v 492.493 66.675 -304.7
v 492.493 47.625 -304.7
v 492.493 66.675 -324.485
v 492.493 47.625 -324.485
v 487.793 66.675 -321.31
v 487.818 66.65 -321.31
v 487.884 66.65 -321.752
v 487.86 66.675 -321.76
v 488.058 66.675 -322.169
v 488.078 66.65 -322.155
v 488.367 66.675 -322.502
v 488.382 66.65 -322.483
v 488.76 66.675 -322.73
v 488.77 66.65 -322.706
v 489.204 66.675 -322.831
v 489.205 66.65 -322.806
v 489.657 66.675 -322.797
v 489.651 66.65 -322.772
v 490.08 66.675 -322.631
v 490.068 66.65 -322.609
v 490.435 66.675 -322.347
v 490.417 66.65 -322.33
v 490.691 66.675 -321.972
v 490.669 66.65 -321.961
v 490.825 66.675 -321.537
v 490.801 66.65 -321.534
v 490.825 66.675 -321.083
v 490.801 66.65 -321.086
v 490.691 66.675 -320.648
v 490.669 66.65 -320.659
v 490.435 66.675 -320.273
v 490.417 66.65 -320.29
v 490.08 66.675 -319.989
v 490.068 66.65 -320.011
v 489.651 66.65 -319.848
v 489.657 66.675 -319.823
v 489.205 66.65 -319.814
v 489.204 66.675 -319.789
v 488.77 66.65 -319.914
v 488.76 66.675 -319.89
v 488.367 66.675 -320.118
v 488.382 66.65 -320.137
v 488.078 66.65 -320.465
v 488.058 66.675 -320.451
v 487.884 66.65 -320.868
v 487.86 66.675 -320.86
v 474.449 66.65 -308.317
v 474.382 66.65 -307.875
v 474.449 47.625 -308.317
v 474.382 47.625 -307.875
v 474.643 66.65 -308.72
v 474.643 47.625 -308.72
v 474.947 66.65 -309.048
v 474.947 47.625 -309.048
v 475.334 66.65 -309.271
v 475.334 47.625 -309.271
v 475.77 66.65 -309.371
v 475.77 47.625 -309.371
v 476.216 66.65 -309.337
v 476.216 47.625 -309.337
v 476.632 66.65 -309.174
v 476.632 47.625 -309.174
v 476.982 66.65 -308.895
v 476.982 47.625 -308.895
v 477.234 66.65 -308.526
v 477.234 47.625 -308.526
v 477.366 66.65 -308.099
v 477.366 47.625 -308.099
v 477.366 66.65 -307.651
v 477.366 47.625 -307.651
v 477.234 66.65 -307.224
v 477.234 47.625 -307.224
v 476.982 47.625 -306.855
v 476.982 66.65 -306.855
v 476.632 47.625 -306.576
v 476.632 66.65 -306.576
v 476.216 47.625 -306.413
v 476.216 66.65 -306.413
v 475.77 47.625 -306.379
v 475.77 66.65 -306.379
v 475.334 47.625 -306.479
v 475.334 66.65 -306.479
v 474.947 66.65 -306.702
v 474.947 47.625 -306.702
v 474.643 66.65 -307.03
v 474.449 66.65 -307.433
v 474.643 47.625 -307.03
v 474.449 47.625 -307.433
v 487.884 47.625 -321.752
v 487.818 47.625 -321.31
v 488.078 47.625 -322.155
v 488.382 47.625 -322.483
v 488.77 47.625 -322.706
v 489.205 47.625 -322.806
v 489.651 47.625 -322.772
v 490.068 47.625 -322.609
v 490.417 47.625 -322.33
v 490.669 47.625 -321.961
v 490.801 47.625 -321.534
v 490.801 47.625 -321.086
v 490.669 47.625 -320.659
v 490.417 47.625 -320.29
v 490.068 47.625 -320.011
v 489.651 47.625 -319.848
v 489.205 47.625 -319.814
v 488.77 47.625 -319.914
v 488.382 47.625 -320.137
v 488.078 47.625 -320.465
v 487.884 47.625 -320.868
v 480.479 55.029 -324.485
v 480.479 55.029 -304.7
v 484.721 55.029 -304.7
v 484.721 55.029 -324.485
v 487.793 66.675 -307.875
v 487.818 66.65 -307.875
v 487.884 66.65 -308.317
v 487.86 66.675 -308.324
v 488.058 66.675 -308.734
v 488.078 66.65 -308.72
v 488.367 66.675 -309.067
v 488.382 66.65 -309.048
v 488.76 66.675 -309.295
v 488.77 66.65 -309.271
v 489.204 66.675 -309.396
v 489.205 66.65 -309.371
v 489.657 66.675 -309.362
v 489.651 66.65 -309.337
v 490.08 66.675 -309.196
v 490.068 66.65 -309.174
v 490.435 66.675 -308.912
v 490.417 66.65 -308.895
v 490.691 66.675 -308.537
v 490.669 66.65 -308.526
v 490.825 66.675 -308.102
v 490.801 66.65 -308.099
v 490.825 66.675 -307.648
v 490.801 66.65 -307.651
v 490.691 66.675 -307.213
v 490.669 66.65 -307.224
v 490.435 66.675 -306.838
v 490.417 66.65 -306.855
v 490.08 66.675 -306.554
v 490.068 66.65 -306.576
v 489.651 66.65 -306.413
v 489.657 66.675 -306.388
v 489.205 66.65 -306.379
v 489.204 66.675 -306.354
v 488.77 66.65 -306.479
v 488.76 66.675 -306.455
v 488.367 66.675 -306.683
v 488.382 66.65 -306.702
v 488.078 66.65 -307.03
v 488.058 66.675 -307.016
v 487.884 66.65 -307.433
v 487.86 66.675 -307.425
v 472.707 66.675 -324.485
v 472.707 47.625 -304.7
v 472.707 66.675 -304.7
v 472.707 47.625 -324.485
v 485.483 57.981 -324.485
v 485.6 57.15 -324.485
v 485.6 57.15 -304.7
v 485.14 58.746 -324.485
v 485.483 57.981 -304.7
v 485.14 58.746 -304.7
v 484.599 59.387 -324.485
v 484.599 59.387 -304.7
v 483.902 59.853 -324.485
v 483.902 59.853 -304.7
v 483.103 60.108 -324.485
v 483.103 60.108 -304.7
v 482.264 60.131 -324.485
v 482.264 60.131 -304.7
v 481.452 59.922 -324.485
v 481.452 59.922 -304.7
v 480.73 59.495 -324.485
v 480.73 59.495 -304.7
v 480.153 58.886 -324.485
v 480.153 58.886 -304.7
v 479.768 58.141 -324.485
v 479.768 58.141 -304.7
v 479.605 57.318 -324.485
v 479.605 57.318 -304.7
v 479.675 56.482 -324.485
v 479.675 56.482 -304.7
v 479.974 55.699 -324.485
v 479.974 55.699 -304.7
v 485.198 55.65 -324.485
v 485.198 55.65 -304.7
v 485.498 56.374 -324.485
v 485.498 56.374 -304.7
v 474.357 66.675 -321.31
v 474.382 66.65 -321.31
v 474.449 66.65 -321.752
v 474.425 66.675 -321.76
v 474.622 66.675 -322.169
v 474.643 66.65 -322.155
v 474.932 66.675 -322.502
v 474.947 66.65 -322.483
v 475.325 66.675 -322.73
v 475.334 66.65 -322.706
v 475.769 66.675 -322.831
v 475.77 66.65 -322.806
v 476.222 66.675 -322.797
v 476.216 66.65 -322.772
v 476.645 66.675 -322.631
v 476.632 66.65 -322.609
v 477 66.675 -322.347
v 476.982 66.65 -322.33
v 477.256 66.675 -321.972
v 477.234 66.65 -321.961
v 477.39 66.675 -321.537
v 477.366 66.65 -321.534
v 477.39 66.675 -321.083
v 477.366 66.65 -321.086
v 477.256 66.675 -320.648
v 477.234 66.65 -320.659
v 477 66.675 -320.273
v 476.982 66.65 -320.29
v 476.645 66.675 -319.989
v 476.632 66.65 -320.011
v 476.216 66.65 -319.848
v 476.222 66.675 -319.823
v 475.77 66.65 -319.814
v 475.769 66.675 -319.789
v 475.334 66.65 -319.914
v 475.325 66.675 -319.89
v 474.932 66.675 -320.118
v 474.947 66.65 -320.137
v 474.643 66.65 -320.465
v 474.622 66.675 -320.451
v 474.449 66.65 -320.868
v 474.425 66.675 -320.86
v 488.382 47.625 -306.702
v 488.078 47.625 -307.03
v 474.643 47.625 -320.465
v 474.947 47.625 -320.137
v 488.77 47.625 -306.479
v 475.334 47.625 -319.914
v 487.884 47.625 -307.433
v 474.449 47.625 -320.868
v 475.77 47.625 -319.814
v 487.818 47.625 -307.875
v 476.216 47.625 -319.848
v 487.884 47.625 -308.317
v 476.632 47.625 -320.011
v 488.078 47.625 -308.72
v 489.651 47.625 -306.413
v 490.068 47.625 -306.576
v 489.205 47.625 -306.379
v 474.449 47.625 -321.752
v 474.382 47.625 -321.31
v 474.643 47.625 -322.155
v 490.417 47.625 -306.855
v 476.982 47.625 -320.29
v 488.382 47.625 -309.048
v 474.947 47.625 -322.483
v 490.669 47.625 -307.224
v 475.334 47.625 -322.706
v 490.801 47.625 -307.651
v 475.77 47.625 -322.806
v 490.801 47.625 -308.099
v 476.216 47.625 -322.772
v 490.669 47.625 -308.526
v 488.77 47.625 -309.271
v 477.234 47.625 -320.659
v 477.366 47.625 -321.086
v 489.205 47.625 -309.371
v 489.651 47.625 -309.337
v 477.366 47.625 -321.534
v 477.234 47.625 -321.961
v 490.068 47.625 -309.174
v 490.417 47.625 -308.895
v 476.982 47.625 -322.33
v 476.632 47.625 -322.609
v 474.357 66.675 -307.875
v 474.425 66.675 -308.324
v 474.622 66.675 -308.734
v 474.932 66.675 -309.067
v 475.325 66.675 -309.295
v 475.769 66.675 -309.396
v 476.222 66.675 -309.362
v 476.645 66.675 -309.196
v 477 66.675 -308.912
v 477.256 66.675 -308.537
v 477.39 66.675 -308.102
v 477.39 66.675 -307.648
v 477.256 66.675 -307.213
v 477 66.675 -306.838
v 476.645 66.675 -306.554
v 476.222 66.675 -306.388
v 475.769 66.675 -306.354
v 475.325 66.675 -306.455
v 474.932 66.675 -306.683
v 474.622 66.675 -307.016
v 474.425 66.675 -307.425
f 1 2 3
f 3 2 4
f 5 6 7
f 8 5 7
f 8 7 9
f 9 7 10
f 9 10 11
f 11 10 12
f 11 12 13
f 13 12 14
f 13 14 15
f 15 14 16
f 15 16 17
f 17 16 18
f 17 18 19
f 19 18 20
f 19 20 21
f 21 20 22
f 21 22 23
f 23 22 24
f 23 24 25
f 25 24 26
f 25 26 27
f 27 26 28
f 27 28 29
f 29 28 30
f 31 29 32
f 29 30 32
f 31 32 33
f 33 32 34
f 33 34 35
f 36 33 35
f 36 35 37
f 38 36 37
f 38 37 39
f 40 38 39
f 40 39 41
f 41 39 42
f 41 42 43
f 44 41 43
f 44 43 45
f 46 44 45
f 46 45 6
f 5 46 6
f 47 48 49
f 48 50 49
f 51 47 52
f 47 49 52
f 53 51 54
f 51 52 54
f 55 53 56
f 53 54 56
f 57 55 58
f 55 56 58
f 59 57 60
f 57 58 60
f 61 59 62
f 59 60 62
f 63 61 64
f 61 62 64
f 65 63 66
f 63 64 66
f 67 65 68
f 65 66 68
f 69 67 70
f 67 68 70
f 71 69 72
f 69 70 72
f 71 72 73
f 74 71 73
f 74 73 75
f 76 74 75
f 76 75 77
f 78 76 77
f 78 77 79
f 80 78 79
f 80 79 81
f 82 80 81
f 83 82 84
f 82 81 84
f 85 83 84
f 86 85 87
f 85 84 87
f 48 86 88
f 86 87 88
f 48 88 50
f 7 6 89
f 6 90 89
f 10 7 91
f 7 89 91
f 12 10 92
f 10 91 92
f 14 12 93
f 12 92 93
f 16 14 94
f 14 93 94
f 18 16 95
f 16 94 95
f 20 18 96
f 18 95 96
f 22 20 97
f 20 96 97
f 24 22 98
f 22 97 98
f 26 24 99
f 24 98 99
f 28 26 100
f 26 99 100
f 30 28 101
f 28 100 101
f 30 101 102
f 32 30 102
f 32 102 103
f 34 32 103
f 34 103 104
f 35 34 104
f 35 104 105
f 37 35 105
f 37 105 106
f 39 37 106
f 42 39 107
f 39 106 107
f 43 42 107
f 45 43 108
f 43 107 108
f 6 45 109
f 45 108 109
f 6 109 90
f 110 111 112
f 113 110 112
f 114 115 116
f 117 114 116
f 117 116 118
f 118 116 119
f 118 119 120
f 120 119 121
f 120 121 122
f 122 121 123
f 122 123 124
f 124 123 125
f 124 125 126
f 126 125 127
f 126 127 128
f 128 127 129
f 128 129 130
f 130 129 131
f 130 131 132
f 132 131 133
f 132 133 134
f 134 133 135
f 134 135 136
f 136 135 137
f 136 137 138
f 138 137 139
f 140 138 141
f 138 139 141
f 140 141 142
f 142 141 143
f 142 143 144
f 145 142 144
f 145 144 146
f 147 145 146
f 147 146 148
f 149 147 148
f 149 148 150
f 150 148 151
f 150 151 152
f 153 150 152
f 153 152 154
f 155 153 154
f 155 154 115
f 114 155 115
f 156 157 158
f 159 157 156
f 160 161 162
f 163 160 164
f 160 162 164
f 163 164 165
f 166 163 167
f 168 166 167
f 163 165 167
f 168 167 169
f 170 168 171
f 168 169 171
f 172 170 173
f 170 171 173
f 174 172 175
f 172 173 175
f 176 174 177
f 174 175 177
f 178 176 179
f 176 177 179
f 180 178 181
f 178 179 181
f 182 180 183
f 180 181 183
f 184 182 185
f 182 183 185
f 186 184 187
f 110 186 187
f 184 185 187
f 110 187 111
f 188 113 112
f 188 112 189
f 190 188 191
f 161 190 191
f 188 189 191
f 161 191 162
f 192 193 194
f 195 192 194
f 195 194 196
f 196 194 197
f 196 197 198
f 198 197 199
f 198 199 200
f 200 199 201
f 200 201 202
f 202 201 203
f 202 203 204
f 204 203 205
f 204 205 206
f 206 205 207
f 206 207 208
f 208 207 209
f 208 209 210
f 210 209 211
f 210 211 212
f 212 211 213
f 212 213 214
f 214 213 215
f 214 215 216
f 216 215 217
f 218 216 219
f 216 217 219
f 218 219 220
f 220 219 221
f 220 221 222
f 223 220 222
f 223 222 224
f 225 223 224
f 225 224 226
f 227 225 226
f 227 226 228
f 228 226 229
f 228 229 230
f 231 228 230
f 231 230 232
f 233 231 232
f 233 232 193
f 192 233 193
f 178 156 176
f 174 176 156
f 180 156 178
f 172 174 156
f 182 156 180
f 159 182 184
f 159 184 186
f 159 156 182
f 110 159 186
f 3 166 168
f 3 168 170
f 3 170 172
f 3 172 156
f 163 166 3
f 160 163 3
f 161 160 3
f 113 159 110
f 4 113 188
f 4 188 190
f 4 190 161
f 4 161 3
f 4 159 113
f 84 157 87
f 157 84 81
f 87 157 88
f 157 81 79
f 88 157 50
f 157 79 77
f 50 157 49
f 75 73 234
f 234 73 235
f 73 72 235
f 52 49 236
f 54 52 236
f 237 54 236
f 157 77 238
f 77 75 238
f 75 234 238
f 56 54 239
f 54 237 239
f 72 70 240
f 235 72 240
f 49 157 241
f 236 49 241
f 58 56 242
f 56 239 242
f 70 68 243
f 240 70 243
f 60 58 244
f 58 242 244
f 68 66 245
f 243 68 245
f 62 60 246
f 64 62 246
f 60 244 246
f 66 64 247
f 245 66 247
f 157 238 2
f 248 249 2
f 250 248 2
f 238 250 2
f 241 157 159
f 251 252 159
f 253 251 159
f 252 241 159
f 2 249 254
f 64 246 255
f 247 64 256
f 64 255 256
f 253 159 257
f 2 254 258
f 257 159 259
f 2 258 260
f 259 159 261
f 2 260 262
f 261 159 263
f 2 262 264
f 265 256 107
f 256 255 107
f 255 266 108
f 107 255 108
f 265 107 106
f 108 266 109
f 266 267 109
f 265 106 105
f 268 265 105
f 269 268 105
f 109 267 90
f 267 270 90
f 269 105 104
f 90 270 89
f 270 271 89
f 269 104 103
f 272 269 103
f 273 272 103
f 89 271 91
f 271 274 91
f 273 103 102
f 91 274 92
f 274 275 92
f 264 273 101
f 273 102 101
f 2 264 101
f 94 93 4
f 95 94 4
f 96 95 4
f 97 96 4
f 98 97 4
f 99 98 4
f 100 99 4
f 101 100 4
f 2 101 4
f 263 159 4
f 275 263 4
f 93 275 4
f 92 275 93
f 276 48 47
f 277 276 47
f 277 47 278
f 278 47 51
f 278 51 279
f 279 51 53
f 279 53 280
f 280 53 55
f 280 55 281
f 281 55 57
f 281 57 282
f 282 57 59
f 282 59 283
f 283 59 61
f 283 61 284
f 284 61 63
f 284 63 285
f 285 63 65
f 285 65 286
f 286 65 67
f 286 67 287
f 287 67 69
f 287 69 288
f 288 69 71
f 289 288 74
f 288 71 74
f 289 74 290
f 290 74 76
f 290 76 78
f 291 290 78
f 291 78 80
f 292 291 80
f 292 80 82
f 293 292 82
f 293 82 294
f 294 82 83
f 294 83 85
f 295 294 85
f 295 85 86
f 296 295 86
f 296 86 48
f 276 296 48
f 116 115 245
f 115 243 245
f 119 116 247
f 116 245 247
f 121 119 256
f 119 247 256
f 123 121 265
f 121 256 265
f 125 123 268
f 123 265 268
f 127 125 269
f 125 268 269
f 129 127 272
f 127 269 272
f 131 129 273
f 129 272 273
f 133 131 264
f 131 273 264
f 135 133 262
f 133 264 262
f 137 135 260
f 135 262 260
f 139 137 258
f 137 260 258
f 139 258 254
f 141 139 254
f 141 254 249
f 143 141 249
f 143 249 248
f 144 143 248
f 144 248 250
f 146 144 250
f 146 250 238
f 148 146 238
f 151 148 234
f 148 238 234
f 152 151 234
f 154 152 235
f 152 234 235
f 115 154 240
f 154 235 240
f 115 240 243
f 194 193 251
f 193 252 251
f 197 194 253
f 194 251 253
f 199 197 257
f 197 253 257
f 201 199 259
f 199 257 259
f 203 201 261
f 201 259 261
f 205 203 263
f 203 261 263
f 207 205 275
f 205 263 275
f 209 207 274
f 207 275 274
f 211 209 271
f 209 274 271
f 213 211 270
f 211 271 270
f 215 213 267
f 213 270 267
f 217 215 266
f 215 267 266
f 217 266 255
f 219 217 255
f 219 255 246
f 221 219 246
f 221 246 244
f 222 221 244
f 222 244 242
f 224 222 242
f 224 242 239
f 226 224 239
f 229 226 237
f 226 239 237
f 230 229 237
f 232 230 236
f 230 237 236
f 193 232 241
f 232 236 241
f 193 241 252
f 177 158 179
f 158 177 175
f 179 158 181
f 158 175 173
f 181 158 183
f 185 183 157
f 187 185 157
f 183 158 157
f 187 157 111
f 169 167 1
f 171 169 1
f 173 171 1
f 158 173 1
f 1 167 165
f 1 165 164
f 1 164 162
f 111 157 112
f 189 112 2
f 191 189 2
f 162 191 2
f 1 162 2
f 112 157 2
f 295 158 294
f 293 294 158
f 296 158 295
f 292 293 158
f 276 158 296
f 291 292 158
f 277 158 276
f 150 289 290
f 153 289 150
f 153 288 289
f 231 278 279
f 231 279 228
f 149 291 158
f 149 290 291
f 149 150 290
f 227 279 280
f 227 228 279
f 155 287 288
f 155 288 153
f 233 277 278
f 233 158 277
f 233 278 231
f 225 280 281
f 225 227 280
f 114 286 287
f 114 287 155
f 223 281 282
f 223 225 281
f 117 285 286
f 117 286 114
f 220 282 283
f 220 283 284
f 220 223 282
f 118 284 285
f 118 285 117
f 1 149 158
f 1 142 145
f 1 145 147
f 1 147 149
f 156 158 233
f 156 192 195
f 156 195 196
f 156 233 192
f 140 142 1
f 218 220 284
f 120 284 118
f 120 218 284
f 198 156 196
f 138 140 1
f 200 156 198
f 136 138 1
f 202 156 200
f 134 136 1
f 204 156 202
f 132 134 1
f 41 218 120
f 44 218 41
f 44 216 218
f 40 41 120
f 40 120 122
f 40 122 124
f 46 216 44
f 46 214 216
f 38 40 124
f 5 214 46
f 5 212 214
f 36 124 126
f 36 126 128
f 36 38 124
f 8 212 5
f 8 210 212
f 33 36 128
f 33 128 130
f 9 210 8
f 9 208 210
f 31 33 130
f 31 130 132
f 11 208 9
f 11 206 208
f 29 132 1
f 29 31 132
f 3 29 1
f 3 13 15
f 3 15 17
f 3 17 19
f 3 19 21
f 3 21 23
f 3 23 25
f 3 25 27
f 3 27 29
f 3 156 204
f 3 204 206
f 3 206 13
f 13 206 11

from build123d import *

# Parameters (mm, degrees)
BOSS_EXTRUDE1_START             = 47.625
SKETCH5_W                       = 19.785028842
SKETCH5_H                       = 19.785028843
BOSS_EXTRUDE1_DEPTH             = 19.05
F_3_0MM_DOWEL_HOLE1_D           = 3
F_3_0MM_DOWEL_HOLE1_DEPTH       = 25.4
F_3_0MM_DOWEL_HOLE1_CSINK_D     = 3.05
F_3_0MM_DOWEL_HOLE1_CSINK_ANGLE = 90
F_3_0MM_DOWEL_HOLE1_TIP         = 0.901290929
CUT_EXTRUDE1_DEPTH              = 594.535969939


with BuildPart() as part:
    # Sketch5 → Boss-Extrude1 (new body)
    with BuildSketch(Plane(origin=(0, 0, 0), x_dir=(1, 0, 0), z_dir=(0, 1, 0)).offset(BOSS_EXTRUDE1_START)):
        with Locations((482.6, 314.592485579)):
            Rectangle(SKETCH5_W, SKETCH5_H)
    extrude(amount=BOSS_EXTRUDE1_DEPTH)

    # Ø3.0mm Dowel Hole1
    with Locations(Plane(origin=(0, 66.675, 0), x_dir=(1, 0, 0), z_dir=(0, 1, 0))):
        with Locations((475.882485579, 321.31), (489.317514421, 321.31), (489.317514421, 307.874971157), (475.882485579, 307.874971157)):
            CounterSinkHole(F_3_0MM_DOWEL_HOLE1_D / 2, F_3_0MM_DOWEL_HOLE1_CSINK_D / 2, depth=F_3_0MM_DOWEL_HOLE1_DEPTH, counter_sink_angle=F_3_0MM_DOWEL_HOLE1_CSINK_ANGLE)
            with Locations((0, 0, -(F_3_0MM_DOWEL_HOLE1_DEPTH + F_3_0MM_DOWEL_HOLE1_TIP / 2))):  # 118° drill point
                Cone(0, F_3_0MM_DOWEL_HOLE1_D / 2, F_3_0MM_DOWEL_HOLE1_TIP, mode=Mode.SUBTRACT)

    # Sketch8 → Cut-Extrude1 (cut, through all)
    with BuildSketch(Plane.XY):
        with BuildLine():
            ThreePointArc((485.6, 57.15), (481.451949703, 59.921638598), (480.478679656, 55.028679656))
            Line((480.478679656, 55.028679656), (484.721320344, 55.028679656))
            ThreePointArc((484.721320344, 55.028679656), (485.371638598, 56.001949703), (485.6, 57.15))
        make_face()
    extrude(amount=-CUT_EXTRUDE1_DEPTH, mode=Mode.SUBTRACT)


solid = part.part
